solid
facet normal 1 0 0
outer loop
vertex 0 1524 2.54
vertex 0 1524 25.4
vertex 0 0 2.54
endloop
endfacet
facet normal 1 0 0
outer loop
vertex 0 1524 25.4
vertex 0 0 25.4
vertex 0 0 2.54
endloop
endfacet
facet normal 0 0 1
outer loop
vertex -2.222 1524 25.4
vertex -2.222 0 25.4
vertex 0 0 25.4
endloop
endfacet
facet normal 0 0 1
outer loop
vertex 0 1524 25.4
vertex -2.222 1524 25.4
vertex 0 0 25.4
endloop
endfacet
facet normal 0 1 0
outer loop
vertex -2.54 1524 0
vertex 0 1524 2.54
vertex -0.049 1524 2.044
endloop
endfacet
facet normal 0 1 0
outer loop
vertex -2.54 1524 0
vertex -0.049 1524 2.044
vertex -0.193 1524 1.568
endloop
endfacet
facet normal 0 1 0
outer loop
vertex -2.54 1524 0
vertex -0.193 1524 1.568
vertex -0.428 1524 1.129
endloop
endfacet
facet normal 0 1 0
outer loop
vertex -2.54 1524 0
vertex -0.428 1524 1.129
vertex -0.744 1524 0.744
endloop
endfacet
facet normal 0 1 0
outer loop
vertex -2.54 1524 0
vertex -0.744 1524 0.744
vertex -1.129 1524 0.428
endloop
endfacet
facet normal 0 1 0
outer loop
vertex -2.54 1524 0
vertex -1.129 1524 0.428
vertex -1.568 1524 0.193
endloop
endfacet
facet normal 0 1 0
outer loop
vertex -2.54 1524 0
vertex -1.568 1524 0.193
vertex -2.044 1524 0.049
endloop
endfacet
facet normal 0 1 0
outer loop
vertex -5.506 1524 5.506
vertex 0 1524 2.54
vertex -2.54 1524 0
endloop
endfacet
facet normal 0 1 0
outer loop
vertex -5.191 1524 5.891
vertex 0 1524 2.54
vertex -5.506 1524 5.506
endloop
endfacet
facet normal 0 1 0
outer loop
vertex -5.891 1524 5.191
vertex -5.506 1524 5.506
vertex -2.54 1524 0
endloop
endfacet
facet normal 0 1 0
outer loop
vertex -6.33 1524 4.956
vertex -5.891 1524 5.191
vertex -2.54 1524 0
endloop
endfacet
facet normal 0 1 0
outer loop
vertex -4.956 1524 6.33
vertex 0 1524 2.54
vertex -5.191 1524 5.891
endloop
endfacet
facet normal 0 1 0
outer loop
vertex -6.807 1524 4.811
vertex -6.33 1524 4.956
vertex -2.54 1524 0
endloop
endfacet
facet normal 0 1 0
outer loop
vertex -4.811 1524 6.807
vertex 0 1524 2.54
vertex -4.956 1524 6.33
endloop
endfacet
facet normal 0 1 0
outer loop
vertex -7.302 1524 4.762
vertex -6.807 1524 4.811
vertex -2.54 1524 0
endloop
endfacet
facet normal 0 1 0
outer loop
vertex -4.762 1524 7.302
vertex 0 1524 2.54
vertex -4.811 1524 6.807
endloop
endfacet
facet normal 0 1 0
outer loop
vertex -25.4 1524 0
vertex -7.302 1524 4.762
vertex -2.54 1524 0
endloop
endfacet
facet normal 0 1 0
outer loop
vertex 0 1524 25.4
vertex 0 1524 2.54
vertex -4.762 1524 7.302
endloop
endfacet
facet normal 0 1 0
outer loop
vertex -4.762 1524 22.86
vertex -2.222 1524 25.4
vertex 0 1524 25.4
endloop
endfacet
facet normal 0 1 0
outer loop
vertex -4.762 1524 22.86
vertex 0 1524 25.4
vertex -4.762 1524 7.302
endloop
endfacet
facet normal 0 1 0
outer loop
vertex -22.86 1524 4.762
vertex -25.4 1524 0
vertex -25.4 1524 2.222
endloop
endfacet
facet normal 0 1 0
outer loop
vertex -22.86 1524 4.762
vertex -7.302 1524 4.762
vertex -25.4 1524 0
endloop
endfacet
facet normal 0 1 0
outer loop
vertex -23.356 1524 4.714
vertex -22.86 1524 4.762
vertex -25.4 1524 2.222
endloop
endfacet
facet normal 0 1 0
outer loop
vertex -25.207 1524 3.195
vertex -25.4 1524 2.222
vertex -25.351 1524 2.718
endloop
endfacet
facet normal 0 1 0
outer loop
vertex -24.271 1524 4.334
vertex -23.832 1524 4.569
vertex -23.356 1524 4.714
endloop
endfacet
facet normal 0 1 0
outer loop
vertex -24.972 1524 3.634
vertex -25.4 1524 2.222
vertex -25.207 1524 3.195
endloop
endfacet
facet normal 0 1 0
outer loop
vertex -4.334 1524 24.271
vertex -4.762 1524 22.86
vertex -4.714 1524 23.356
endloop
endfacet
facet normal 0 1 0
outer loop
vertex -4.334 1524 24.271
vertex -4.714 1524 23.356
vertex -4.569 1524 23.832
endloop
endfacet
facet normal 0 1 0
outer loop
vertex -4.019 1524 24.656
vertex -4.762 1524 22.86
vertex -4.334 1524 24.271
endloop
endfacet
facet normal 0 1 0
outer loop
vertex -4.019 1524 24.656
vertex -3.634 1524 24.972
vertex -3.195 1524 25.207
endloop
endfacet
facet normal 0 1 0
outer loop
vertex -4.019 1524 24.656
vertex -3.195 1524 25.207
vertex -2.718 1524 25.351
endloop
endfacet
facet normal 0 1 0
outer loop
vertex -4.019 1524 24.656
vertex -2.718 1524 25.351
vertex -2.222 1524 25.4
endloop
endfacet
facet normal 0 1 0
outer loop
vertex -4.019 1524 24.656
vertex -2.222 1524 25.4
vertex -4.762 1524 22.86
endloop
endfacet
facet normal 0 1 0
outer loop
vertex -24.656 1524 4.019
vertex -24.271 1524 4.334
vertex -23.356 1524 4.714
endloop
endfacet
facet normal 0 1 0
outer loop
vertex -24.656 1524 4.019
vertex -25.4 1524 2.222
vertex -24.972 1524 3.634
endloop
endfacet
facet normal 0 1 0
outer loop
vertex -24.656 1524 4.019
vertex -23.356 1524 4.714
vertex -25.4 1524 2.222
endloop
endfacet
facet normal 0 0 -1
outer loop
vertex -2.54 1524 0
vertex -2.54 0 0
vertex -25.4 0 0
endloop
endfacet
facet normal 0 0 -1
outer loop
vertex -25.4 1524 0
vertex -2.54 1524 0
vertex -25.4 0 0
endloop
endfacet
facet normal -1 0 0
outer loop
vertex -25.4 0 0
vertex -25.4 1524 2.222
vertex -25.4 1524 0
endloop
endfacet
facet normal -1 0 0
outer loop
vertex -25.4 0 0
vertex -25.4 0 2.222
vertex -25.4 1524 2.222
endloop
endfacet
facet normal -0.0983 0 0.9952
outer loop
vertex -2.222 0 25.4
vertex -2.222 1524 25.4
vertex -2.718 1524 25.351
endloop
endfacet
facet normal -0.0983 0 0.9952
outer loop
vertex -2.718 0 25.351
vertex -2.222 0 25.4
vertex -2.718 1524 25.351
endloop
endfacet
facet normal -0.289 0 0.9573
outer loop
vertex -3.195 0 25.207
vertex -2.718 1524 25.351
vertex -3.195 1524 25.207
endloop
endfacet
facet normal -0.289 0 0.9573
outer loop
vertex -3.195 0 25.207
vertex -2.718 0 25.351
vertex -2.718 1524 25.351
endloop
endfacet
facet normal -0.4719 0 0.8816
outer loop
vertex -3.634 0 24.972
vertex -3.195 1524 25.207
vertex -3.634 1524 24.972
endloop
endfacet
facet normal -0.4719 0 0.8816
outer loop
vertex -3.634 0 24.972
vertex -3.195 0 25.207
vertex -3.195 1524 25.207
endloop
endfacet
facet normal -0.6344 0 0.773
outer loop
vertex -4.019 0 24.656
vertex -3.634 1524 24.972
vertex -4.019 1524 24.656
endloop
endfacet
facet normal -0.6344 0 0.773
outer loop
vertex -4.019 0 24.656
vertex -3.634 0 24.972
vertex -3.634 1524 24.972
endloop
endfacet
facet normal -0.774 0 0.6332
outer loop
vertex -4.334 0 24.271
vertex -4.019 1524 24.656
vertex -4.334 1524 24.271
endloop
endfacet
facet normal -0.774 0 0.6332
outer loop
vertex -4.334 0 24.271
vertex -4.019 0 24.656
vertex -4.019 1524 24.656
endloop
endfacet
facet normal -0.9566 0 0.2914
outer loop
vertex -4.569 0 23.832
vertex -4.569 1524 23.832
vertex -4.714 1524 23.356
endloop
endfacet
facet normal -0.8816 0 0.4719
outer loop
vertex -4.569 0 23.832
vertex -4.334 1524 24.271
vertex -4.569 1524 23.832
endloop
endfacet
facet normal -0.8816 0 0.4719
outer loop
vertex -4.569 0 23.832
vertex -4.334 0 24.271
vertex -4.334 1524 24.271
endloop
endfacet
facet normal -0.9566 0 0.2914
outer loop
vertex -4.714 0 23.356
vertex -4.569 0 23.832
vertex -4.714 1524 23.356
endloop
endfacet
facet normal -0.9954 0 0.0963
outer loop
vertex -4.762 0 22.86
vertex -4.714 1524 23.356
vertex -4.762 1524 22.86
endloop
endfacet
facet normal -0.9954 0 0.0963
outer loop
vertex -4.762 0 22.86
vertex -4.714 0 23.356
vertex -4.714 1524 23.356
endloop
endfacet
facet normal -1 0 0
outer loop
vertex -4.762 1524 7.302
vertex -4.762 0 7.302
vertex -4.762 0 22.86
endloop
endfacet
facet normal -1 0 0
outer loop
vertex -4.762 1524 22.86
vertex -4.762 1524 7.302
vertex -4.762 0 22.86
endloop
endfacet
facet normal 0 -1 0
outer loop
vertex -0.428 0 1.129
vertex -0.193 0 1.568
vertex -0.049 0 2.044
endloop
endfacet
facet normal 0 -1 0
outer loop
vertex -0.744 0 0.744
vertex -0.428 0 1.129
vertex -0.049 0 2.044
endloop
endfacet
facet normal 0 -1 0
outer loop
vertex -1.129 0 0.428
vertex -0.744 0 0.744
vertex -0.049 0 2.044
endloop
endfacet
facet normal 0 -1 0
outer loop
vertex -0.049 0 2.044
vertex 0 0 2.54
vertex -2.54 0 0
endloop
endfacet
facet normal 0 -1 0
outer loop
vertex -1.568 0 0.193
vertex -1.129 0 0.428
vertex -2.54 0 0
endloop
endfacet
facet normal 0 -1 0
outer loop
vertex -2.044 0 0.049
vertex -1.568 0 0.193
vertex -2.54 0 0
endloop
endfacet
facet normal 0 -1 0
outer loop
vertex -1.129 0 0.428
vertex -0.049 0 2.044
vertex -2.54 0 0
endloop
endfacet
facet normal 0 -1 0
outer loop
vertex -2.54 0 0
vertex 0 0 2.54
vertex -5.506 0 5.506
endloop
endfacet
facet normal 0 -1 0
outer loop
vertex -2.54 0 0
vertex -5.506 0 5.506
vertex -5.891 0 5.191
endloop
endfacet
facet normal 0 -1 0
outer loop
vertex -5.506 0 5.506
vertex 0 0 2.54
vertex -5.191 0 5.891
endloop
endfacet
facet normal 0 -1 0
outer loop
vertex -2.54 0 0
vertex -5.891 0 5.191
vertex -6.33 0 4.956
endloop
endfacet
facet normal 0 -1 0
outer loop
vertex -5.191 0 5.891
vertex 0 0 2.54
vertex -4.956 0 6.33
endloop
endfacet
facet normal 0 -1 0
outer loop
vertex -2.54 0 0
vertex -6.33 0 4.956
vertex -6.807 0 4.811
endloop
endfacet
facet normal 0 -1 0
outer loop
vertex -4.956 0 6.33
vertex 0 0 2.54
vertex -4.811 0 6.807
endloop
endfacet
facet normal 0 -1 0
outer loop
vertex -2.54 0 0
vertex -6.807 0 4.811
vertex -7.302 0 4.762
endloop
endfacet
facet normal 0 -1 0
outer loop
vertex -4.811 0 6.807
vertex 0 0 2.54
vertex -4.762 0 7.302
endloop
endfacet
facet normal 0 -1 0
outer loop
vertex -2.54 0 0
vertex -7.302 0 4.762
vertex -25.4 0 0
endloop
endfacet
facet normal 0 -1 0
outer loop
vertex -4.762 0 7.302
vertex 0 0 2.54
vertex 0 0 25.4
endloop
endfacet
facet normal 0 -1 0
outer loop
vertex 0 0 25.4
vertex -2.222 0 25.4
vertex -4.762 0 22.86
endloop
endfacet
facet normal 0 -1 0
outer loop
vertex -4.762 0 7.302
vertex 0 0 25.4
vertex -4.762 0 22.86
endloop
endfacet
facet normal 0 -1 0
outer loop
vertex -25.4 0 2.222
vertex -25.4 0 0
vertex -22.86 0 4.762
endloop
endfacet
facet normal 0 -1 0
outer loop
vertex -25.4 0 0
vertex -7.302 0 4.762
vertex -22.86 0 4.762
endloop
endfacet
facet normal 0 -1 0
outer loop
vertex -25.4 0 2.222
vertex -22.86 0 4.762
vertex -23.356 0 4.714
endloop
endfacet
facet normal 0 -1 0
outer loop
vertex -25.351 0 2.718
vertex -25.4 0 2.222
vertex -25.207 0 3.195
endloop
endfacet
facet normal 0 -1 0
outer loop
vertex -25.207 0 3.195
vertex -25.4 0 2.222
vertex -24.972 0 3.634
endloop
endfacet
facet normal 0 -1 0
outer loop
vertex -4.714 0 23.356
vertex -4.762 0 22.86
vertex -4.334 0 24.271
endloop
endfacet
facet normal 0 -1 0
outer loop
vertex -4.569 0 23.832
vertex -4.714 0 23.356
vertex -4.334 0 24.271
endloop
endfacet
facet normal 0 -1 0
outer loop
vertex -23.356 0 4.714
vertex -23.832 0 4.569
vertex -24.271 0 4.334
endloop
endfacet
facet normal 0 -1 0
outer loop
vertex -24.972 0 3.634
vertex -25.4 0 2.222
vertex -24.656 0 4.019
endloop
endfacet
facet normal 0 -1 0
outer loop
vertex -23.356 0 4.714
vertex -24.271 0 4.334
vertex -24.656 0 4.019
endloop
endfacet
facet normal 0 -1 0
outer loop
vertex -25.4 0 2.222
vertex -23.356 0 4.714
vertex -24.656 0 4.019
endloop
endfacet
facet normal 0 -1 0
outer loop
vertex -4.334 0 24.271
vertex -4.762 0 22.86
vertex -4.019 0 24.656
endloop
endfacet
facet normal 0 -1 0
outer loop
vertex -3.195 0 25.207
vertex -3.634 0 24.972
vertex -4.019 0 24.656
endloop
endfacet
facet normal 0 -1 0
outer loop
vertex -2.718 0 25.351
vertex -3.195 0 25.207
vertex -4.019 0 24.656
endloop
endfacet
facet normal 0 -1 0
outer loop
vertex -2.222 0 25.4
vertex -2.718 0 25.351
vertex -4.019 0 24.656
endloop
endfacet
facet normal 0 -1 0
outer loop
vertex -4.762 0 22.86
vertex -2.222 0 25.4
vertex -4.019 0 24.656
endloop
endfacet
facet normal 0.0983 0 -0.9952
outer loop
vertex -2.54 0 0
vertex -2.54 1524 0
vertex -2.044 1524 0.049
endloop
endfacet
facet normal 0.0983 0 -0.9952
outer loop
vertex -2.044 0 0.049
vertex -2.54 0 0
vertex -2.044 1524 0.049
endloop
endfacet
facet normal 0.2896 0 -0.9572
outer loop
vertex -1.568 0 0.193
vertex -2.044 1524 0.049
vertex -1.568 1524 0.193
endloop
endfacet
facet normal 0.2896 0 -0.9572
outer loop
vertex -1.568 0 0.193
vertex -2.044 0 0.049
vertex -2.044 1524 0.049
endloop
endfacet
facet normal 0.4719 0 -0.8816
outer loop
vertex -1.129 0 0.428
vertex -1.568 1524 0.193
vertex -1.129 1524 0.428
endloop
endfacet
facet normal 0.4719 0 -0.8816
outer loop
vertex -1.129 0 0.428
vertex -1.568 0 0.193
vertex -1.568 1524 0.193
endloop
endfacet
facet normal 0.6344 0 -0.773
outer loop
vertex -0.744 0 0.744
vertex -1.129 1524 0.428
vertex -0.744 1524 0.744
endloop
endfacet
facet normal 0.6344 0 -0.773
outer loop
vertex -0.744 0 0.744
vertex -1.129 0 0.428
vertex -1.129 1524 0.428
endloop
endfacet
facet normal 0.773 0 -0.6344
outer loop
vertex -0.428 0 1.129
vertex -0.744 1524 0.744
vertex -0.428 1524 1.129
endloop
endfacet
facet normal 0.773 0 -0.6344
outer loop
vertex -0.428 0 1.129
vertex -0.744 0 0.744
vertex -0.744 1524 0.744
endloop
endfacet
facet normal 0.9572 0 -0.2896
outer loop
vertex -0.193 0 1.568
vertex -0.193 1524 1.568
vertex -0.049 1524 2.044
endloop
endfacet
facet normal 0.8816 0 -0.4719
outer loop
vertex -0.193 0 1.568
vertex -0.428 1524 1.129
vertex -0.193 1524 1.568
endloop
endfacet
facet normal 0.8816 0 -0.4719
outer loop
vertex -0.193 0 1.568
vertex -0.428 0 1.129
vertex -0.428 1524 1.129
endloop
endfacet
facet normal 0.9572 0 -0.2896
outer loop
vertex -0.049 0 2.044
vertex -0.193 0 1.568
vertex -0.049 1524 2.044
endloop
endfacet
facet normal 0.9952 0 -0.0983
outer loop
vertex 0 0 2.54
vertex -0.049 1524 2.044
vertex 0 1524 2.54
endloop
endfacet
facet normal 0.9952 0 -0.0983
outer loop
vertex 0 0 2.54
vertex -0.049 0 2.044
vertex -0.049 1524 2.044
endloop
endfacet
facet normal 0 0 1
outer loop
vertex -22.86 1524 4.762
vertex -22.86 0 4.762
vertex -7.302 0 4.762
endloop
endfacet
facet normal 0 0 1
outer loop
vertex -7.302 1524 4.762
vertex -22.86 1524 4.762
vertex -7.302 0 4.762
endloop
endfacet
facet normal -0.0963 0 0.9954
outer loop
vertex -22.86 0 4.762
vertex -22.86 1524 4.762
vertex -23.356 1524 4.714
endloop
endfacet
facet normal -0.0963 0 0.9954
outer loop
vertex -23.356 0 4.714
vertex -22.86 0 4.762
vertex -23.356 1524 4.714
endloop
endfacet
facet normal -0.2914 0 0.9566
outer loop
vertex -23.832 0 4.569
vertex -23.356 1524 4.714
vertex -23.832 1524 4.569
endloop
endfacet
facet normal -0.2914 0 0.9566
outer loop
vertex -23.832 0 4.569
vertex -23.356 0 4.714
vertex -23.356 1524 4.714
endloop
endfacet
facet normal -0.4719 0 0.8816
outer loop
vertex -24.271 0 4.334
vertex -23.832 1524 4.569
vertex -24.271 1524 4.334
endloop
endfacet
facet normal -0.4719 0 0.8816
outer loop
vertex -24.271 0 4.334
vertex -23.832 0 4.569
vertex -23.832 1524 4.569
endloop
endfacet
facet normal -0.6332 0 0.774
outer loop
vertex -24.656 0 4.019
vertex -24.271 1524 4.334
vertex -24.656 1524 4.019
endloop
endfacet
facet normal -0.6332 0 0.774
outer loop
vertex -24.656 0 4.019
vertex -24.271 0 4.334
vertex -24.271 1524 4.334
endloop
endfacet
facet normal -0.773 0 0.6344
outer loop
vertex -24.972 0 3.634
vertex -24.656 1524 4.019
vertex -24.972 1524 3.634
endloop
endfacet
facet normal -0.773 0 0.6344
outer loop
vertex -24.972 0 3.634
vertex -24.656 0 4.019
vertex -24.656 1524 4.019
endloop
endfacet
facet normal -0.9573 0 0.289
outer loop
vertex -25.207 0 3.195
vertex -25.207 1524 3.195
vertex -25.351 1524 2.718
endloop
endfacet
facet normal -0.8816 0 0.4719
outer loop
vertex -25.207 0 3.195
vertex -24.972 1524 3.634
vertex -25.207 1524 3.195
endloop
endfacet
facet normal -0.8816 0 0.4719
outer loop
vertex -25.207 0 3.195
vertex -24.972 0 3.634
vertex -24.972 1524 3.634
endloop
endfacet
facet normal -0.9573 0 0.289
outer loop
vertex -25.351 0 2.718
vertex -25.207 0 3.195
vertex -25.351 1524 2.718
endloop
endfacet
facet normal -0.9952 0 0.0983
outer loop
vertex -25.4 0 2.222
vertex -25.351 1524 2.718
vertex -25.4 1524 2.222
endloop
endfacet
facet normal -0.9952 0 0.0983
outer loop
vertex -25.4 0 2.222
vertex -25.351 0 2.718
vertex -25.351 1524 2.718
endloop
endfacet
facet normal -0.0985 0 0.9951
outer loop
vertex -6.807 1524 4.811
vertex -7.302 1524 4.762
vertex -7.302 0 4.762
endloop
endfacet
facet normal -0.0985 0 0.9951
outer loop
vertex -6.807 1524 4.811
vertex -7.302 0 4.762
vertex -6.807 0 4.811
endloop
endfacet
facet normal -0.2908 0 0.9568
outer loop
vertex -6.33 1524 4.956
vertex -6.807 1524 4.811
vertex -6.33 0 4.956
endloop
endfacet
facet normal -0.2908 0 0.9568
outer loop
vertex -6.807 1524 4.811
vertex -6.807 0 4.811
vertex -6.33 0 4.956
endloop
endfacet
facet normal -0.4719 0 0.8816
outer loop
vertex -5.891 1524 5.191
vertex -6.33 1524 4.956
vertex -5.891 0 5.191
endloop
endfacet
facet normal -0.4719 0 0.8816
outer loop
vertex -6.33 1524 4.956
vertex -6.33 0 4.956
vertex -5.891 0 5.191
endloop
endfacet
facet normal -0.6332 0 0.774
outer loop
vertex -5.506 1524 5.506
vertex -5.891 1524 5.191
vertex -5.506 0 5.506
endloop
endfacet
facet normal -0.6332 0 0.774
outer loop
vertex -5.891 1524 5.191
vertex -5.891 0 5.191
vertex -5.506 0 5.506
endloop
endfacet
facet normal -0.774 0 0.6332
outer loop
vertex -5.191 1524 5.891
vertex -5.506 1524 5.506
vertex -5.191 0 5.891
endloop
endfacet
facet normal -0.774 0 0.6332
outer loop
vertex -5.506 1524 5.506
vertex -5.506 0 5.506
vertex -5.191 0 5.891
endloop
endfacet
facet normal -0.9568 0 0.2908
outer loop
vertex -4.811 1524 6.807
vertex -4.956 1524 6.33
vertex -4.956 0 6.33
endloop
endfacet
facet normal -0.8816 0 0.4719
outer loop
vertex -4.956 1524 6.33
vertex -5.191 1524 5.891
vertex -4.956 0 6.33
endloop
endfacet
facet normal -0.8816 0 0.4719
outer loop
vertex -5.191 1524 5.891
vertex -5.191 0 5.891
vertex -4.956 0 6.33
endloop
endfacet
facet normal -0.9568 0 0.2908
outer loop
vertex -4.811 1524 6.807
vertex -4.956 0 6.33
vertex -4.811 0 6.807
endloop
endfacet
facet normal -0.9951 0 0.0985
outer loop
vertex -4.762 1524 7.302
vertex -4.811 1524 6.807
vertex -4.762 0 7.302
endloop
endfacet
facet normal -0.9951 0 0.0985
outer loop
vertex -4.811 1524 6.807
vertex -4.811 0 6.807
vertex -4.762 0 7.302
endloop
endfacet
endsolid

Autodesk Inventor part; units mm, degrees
ref_plane "YZ Plane" through (0, 0, 0) normal (1, 0, 0) x (0, 1, 0)
ref_plane "XZ Plane" through (0, 0, 0) normal (0, 1, 0) x (-1, 0, 0)
ref_plane "XY Plane" through (0, 0, 0) normal (0, 0, 1) x (1, 0, 0)
sketch "Sketch1" plane through (0, 0, 0) normal (0, 1, 0) x (-1, 0, 0)
  line L0 (2.54, 0) -> (25.4, 0)
  line L1 (0, 25.4) -> (0, 2.54)
  line L2 (22.86, 4.7625) -> (7.3025, 4.7625)
  line L3 (4.7625, 7.3025) -> (4.7625, 22.86)
  line L4 (2.2225, 25.4) -> (0, 25.4)
  line L5 (25.4, 2.2225) -> (25.4, 0)
  arc A0 (4.7625, 7.3025) -> (7.3025, 4.7625) centre (7.3025, 7.3025) ccw
  arc A1 (4.7625, 22.86) -> (2.2225, 25.4) centre (2.2225, 22.86) ccw
  arc A2 (0, 2.54) -> (2.54, 0) centre (2.54, 2.54) ccw
  arc A3 (25.4, 2.2225) -> (22.86, 4.7625) centre (22.86, 2.2225) ccw
  point P0 (0, 0)
  dimension "d2" = 4.7625
  dimension "d3" = 25.4
  dimension "d4" = 25.4
  dimension "d5" = 2.54
extrude "Back Leg" add sketch "Sketch1" along normal blind 1524
properties part number "legs-bl_t"
